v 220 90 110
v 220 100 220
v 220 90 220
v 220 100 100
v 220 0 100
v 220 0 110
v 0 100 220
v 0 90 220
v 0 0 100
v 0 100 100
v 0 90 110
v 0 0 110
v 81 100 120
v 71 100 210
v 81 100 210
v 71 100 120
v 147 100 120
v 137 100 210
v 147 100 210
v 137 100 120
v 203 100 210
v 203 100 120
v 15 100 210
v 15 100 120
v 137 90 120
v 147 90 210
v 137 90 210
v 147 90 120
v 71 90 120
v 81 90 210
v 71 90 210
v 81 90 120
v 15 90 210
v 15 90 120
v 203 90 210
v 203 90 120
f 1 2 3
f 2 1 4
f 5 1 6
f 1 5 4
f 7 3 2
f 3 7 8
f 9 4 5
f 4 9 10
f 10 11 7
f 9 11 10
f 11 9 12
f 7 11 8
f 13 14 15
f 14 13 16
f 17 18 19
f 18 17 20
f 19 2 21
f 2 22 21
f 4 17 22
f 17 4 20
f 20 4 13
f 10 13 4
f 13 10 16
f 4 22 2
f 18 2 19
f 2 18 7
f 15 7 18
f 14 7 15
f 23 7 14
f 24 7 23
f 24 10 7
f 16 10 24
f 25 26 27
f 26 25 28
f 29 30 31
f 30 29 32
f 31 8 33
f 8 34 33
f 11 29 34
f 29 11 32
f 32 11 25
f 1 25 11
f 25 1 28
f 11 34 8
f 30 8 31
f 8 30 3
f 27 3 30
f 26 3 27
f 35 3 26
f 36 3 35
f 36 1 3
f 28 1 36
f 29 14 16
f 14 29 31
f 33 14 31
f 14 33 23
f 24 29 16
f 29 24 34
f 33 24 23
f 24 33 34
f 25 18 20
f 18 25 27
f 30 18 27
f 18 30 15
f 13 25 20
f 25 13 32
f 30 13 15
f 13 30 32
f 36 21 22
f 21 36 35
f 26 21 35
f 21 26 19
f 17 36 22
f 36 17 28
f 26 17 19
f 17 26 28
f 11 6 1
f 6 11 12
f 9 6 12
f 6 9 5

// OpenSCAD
//100

difference(){

           

              
   translate([0,90,100])
   cube([220,10,120]);

   translate([15,89,120])
   cube([56,12,90]);
    
   translate([81,89,120])
   cube([56,12,90]);
   
    translate([147,89,120])
   cube([56,12,90]);
            
}  
     
 translate([0,0,100])
 cube([220,100,10]);
